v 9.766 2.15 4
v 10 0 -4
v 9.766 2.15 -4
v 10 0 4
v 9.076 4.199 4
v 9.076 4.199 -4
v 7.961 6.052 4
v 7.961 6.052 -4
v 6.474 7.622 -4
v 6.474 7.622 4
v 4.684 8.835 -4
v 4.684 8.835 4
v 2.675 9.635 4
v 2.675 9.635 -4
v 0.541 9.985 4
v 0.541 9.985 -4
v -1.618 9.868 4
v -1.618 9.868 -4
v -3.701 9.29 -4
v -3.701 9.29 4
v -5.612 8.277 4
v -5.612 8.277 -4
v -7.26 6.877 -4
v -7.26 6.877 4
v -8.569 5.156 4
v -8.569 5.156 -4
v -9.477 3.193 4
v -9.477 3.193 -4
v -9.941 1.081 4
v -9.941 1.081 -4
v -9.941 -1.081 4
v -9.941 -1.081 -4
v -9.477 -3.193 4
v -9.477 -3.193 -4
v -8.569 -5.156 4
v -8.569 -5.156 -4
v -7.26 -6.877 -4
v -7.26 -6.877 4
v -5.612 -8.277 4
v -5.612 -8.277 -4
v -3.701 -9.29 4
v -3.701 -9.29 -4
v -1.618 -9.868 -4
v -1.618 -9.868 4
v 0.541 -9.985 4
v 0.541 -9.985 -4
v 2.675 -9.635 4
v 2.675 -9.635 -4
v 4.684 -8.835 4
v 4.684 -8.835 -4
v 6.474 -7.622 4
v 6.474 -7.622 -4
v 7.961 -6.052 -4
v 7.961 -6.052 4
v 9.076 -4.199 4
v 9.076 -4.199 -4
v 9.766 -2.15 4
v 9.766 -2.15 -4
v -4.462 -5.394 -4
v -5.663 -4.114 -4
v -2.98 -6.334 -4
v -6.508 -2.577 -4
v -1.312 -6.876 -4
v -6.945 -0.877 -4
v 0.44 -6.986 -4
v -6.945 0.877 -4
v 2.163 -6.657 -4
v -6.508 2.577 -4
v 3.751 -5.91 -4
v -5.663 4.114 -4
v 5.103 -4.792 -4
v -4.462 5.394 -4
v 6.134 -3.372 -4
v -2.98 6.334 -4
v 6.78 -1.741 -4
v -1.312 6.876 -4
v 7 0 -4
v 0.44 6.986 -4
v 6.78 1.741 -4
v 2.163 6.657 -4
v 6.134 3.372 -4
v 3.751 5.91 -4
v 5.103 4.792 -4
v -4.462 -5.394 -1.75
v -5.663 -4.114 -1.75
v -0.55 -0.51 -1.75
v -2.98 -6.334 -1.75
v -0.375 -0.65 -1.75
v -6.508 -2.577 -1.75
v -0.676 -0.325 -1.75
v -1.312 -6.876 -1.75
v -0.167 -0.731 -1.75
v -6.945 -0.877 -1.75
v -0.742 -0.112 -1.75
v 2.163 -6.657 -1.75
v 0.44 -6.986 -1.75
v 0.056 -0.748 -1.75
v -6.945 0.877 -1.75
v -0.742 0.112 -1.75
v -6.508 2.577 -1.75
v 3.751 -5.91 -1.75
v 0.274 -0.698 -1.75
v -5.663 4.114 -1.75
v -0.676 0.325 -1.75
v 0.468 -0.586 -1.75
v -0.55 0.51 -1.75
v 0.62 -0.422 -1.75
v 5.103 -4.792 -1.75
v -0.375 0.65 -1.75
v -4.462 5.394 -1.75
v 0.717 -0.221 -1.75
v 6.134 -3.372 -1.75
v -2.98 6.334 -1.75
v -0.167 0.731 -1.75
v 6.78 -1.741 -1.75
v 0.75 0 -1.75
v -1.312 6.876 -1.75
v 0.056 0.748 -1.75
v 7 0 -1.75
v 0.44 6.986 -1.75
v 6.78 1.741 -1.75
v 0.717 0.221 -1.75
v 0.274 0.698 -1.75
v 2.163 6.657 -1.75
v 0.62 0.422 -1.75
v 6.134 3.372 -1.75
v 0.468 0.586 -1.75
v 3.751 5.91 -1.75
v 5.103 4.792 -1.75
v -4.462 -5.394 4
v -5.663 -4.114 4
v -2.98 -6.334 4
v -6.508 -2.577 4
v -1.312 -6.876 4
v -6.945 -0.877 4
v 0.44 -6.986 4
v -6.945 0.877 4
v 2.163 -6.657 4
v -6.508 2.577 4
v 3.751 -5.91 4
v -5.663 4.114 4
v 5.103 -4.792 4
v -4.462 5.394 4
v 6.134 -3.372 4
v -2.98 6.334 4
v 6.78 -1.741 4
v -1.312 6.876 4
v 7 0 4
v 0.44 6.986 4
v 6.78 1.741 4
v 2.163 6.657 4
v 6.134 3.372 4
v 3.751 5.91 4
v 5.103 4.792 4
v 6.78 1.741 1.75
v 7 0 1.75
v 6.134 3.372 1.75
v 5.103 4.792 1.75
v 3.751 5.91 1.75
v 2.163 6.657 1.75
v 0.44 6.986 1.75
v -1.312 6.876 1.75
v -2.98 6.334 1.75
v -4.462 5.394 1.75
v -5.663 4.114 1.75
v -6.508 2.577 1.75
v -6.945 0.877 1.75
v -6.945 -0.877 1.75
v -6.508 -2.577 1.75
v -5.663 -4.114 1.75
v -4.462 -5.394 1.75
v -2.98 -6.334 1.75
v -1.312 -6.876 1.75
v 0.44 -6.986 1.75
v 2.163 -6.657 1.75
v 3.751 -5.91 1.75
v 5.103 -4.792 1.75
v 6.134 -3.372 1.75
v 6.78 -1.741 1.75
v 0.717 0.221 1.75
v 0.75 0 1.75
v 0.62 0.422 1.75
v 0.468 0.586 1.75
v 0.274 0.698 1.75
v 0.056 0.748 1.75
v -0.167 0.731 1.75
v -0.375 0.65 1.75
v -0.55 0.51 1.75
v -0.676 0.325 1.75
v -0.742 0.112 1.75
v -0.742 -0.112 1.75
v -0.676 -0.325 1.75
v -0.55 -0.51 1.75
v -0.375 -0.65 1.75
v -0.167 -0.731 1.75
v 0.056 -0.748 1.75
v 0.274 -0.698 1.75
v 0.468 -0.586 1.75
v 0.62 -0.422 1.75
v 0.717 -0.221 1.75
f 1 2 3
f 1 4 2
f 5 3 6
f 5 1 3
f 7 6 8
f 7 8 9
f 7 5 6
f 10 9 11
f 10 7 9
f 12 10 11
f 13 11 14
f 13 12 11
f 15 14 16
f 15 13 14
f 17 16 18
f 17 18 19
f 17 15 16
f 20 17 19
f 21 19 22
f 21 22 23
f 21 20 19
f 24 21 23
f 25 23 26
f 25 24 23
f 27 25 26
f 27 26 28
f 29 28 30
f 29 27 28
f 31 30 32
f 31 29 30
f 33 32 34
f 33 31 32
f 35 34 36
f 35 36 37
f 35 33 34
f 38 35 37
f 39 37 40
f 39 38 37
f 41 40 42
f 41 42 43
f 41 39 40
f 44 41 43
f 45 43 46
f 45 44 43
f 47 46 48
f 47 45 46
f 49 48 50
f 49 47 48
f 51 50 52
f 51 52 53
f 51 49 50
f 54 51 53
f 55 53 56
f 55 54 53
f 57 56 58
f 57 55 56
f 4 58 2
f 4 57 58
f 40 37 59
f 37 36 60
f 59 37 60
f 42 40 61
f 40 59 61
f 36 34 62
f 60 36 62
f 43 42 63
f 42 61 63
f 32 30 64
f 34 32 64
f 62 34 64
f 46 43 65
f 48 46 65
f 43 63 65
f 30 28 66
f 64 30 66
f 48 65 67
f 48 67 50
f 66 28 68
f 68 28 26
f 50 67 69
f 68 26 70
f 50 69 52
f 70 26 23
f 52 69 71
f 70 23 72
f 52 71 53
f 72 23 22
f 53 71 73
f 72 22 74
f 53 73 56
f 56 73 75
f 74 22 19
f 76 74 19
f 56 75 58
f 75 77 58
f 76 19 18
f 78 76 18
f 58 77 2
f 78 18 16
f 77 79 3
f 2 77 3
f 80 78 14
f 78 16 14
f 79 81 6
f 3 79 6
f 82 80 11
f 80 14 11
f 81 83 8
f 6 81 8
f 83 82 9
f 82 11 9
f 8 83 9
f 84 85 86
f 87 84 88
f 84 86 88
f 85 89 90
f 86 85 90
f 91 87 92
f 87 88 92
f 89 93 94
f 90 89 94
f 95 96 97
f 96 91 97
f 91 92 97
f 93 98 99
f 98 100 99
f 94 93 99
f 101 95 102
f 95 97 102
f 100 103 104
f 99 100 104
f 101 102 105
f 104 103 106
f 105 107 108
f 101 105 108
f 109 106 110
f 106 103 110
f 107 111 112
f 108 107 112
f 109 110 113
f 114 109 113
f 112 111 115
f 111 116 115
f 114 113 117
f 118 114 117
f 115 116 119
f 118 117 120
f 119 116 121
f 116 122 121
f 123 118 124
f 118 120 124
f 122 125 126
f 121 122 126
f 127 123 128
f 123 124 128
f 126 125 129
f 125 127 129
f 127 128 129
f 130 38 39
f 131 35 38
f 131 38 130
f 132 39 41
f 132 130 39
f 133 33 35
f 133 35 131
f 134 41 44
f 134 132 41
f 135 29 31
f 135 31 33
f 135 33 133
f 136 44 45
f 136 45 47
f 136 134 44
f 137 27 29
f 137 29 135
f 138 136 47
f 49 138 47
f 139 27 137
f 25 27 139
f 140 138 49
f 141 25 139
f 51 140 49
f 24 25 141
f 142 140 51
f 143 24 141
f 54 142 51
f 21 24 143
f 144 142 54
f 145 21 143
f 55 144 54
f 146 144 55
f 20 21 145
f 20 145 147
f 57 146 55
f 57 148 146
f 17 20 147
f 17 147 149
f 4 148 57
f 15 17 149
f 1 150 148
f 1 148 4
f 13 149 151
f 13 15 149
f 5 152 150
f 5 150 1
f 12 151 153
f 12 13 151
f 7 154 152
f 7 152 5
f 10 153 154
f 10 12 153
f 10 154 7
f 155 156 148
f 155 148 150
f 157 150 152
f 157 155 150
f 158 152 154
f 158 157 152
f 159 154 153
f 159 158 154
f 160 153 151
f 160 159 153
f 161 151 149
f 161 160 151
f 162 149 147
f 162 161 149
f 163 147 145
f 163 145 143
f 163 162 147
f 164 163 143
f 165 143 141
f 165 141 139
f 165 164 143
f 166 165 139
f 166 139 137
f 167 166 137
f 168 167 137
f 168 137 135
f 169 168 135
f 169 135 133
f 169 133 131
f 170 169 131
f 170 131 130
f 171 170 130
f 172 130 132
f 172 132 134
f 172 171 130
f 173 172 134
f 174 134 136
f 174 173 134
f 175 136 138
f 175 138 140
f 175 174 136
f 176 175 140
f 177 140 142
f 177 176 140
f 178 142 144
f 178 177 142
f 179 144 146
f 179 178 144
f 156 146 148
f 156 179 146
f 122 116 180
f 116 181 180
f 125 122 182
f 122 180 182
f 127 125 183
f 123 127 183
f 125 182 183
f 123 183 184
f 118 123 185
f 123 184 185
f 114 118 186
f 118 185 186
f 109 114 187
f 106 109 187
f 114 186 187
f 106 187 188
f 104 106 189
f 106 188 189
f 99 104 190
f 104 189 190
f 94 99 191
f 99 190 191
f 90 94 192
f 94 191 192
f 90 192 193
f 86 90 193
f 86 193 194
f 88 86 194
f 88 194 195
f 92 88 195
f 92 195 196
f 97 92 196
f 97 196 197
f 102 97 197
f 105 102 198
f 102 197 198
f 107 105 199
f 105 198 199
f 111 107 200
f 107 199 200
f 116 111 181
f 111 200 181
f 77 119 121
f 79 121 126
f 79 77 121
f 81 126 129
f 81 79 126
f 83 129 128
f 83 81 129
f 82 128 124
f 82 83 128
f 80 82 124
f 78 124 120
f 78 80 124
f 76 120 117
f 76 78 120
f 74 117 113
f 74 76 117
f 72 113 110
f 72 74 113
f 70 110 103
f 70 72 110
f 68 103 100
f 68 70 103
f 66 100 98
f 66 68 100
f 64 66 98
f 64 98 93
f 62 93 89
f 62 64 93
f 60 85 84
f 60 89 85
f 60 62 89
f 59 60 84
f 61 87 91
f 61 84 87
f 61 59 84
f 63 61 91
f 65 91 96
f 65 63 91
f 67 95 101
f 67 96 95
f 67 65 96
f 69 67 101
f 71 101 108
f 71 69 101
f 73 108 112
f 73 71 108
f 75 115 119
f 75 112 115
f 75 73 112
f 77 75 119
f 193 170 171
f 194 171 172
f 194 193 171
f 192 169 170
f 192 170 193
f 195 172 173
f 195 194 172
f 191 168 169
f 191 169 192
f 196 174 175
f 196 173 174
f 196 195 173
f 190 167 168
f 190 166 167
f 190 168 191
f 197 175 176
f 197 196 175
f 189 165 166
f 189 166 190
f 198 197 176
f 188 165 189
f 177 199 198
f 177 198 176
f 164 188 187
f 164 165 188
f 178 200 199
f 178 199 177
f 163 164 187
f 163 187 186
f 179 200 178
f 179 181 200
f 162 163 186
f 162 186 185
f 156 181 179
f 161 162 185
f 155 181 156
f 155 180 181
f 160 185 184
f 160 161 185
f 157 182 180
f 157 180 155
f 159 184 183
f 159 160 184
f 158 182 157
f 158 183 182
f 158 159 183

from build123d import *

# Parameters (mm, degrees)
F0_R     = 10
F1_DEPTH = 1.75
F2_R     = 0.75
F3_DEPTH = 10
F4_R     = 10
F4_R_2   = 7
F5_DEPTH = 4


with BuildPart() as f1:
    # F0 (on Top) → F1 (new body, symmetric)
    with BuildSketch(Plane.XY):
        Circle(F0_R)
    extrude(amount=F1_DEPTH, both=True)

    # F2 (on face) → F3 (cut, symmetric)
    with BuildSketch(Plane.XY.offset(1.75)):
        Circle(F2_R)
    extrude(amount=F3_DEPTH, both=True, mode=Mode.SUBTRACT)

    # F4 (on Top) → F5 (join, symmetric)
    with BuildSketch(Plane.XY):
        Circle(F4_R)
        Circle(F4_R_2, mode=Mode.SUBTRACT)
    extrude(amount=F5_DEPTH, both=True)


solid = f1.part
